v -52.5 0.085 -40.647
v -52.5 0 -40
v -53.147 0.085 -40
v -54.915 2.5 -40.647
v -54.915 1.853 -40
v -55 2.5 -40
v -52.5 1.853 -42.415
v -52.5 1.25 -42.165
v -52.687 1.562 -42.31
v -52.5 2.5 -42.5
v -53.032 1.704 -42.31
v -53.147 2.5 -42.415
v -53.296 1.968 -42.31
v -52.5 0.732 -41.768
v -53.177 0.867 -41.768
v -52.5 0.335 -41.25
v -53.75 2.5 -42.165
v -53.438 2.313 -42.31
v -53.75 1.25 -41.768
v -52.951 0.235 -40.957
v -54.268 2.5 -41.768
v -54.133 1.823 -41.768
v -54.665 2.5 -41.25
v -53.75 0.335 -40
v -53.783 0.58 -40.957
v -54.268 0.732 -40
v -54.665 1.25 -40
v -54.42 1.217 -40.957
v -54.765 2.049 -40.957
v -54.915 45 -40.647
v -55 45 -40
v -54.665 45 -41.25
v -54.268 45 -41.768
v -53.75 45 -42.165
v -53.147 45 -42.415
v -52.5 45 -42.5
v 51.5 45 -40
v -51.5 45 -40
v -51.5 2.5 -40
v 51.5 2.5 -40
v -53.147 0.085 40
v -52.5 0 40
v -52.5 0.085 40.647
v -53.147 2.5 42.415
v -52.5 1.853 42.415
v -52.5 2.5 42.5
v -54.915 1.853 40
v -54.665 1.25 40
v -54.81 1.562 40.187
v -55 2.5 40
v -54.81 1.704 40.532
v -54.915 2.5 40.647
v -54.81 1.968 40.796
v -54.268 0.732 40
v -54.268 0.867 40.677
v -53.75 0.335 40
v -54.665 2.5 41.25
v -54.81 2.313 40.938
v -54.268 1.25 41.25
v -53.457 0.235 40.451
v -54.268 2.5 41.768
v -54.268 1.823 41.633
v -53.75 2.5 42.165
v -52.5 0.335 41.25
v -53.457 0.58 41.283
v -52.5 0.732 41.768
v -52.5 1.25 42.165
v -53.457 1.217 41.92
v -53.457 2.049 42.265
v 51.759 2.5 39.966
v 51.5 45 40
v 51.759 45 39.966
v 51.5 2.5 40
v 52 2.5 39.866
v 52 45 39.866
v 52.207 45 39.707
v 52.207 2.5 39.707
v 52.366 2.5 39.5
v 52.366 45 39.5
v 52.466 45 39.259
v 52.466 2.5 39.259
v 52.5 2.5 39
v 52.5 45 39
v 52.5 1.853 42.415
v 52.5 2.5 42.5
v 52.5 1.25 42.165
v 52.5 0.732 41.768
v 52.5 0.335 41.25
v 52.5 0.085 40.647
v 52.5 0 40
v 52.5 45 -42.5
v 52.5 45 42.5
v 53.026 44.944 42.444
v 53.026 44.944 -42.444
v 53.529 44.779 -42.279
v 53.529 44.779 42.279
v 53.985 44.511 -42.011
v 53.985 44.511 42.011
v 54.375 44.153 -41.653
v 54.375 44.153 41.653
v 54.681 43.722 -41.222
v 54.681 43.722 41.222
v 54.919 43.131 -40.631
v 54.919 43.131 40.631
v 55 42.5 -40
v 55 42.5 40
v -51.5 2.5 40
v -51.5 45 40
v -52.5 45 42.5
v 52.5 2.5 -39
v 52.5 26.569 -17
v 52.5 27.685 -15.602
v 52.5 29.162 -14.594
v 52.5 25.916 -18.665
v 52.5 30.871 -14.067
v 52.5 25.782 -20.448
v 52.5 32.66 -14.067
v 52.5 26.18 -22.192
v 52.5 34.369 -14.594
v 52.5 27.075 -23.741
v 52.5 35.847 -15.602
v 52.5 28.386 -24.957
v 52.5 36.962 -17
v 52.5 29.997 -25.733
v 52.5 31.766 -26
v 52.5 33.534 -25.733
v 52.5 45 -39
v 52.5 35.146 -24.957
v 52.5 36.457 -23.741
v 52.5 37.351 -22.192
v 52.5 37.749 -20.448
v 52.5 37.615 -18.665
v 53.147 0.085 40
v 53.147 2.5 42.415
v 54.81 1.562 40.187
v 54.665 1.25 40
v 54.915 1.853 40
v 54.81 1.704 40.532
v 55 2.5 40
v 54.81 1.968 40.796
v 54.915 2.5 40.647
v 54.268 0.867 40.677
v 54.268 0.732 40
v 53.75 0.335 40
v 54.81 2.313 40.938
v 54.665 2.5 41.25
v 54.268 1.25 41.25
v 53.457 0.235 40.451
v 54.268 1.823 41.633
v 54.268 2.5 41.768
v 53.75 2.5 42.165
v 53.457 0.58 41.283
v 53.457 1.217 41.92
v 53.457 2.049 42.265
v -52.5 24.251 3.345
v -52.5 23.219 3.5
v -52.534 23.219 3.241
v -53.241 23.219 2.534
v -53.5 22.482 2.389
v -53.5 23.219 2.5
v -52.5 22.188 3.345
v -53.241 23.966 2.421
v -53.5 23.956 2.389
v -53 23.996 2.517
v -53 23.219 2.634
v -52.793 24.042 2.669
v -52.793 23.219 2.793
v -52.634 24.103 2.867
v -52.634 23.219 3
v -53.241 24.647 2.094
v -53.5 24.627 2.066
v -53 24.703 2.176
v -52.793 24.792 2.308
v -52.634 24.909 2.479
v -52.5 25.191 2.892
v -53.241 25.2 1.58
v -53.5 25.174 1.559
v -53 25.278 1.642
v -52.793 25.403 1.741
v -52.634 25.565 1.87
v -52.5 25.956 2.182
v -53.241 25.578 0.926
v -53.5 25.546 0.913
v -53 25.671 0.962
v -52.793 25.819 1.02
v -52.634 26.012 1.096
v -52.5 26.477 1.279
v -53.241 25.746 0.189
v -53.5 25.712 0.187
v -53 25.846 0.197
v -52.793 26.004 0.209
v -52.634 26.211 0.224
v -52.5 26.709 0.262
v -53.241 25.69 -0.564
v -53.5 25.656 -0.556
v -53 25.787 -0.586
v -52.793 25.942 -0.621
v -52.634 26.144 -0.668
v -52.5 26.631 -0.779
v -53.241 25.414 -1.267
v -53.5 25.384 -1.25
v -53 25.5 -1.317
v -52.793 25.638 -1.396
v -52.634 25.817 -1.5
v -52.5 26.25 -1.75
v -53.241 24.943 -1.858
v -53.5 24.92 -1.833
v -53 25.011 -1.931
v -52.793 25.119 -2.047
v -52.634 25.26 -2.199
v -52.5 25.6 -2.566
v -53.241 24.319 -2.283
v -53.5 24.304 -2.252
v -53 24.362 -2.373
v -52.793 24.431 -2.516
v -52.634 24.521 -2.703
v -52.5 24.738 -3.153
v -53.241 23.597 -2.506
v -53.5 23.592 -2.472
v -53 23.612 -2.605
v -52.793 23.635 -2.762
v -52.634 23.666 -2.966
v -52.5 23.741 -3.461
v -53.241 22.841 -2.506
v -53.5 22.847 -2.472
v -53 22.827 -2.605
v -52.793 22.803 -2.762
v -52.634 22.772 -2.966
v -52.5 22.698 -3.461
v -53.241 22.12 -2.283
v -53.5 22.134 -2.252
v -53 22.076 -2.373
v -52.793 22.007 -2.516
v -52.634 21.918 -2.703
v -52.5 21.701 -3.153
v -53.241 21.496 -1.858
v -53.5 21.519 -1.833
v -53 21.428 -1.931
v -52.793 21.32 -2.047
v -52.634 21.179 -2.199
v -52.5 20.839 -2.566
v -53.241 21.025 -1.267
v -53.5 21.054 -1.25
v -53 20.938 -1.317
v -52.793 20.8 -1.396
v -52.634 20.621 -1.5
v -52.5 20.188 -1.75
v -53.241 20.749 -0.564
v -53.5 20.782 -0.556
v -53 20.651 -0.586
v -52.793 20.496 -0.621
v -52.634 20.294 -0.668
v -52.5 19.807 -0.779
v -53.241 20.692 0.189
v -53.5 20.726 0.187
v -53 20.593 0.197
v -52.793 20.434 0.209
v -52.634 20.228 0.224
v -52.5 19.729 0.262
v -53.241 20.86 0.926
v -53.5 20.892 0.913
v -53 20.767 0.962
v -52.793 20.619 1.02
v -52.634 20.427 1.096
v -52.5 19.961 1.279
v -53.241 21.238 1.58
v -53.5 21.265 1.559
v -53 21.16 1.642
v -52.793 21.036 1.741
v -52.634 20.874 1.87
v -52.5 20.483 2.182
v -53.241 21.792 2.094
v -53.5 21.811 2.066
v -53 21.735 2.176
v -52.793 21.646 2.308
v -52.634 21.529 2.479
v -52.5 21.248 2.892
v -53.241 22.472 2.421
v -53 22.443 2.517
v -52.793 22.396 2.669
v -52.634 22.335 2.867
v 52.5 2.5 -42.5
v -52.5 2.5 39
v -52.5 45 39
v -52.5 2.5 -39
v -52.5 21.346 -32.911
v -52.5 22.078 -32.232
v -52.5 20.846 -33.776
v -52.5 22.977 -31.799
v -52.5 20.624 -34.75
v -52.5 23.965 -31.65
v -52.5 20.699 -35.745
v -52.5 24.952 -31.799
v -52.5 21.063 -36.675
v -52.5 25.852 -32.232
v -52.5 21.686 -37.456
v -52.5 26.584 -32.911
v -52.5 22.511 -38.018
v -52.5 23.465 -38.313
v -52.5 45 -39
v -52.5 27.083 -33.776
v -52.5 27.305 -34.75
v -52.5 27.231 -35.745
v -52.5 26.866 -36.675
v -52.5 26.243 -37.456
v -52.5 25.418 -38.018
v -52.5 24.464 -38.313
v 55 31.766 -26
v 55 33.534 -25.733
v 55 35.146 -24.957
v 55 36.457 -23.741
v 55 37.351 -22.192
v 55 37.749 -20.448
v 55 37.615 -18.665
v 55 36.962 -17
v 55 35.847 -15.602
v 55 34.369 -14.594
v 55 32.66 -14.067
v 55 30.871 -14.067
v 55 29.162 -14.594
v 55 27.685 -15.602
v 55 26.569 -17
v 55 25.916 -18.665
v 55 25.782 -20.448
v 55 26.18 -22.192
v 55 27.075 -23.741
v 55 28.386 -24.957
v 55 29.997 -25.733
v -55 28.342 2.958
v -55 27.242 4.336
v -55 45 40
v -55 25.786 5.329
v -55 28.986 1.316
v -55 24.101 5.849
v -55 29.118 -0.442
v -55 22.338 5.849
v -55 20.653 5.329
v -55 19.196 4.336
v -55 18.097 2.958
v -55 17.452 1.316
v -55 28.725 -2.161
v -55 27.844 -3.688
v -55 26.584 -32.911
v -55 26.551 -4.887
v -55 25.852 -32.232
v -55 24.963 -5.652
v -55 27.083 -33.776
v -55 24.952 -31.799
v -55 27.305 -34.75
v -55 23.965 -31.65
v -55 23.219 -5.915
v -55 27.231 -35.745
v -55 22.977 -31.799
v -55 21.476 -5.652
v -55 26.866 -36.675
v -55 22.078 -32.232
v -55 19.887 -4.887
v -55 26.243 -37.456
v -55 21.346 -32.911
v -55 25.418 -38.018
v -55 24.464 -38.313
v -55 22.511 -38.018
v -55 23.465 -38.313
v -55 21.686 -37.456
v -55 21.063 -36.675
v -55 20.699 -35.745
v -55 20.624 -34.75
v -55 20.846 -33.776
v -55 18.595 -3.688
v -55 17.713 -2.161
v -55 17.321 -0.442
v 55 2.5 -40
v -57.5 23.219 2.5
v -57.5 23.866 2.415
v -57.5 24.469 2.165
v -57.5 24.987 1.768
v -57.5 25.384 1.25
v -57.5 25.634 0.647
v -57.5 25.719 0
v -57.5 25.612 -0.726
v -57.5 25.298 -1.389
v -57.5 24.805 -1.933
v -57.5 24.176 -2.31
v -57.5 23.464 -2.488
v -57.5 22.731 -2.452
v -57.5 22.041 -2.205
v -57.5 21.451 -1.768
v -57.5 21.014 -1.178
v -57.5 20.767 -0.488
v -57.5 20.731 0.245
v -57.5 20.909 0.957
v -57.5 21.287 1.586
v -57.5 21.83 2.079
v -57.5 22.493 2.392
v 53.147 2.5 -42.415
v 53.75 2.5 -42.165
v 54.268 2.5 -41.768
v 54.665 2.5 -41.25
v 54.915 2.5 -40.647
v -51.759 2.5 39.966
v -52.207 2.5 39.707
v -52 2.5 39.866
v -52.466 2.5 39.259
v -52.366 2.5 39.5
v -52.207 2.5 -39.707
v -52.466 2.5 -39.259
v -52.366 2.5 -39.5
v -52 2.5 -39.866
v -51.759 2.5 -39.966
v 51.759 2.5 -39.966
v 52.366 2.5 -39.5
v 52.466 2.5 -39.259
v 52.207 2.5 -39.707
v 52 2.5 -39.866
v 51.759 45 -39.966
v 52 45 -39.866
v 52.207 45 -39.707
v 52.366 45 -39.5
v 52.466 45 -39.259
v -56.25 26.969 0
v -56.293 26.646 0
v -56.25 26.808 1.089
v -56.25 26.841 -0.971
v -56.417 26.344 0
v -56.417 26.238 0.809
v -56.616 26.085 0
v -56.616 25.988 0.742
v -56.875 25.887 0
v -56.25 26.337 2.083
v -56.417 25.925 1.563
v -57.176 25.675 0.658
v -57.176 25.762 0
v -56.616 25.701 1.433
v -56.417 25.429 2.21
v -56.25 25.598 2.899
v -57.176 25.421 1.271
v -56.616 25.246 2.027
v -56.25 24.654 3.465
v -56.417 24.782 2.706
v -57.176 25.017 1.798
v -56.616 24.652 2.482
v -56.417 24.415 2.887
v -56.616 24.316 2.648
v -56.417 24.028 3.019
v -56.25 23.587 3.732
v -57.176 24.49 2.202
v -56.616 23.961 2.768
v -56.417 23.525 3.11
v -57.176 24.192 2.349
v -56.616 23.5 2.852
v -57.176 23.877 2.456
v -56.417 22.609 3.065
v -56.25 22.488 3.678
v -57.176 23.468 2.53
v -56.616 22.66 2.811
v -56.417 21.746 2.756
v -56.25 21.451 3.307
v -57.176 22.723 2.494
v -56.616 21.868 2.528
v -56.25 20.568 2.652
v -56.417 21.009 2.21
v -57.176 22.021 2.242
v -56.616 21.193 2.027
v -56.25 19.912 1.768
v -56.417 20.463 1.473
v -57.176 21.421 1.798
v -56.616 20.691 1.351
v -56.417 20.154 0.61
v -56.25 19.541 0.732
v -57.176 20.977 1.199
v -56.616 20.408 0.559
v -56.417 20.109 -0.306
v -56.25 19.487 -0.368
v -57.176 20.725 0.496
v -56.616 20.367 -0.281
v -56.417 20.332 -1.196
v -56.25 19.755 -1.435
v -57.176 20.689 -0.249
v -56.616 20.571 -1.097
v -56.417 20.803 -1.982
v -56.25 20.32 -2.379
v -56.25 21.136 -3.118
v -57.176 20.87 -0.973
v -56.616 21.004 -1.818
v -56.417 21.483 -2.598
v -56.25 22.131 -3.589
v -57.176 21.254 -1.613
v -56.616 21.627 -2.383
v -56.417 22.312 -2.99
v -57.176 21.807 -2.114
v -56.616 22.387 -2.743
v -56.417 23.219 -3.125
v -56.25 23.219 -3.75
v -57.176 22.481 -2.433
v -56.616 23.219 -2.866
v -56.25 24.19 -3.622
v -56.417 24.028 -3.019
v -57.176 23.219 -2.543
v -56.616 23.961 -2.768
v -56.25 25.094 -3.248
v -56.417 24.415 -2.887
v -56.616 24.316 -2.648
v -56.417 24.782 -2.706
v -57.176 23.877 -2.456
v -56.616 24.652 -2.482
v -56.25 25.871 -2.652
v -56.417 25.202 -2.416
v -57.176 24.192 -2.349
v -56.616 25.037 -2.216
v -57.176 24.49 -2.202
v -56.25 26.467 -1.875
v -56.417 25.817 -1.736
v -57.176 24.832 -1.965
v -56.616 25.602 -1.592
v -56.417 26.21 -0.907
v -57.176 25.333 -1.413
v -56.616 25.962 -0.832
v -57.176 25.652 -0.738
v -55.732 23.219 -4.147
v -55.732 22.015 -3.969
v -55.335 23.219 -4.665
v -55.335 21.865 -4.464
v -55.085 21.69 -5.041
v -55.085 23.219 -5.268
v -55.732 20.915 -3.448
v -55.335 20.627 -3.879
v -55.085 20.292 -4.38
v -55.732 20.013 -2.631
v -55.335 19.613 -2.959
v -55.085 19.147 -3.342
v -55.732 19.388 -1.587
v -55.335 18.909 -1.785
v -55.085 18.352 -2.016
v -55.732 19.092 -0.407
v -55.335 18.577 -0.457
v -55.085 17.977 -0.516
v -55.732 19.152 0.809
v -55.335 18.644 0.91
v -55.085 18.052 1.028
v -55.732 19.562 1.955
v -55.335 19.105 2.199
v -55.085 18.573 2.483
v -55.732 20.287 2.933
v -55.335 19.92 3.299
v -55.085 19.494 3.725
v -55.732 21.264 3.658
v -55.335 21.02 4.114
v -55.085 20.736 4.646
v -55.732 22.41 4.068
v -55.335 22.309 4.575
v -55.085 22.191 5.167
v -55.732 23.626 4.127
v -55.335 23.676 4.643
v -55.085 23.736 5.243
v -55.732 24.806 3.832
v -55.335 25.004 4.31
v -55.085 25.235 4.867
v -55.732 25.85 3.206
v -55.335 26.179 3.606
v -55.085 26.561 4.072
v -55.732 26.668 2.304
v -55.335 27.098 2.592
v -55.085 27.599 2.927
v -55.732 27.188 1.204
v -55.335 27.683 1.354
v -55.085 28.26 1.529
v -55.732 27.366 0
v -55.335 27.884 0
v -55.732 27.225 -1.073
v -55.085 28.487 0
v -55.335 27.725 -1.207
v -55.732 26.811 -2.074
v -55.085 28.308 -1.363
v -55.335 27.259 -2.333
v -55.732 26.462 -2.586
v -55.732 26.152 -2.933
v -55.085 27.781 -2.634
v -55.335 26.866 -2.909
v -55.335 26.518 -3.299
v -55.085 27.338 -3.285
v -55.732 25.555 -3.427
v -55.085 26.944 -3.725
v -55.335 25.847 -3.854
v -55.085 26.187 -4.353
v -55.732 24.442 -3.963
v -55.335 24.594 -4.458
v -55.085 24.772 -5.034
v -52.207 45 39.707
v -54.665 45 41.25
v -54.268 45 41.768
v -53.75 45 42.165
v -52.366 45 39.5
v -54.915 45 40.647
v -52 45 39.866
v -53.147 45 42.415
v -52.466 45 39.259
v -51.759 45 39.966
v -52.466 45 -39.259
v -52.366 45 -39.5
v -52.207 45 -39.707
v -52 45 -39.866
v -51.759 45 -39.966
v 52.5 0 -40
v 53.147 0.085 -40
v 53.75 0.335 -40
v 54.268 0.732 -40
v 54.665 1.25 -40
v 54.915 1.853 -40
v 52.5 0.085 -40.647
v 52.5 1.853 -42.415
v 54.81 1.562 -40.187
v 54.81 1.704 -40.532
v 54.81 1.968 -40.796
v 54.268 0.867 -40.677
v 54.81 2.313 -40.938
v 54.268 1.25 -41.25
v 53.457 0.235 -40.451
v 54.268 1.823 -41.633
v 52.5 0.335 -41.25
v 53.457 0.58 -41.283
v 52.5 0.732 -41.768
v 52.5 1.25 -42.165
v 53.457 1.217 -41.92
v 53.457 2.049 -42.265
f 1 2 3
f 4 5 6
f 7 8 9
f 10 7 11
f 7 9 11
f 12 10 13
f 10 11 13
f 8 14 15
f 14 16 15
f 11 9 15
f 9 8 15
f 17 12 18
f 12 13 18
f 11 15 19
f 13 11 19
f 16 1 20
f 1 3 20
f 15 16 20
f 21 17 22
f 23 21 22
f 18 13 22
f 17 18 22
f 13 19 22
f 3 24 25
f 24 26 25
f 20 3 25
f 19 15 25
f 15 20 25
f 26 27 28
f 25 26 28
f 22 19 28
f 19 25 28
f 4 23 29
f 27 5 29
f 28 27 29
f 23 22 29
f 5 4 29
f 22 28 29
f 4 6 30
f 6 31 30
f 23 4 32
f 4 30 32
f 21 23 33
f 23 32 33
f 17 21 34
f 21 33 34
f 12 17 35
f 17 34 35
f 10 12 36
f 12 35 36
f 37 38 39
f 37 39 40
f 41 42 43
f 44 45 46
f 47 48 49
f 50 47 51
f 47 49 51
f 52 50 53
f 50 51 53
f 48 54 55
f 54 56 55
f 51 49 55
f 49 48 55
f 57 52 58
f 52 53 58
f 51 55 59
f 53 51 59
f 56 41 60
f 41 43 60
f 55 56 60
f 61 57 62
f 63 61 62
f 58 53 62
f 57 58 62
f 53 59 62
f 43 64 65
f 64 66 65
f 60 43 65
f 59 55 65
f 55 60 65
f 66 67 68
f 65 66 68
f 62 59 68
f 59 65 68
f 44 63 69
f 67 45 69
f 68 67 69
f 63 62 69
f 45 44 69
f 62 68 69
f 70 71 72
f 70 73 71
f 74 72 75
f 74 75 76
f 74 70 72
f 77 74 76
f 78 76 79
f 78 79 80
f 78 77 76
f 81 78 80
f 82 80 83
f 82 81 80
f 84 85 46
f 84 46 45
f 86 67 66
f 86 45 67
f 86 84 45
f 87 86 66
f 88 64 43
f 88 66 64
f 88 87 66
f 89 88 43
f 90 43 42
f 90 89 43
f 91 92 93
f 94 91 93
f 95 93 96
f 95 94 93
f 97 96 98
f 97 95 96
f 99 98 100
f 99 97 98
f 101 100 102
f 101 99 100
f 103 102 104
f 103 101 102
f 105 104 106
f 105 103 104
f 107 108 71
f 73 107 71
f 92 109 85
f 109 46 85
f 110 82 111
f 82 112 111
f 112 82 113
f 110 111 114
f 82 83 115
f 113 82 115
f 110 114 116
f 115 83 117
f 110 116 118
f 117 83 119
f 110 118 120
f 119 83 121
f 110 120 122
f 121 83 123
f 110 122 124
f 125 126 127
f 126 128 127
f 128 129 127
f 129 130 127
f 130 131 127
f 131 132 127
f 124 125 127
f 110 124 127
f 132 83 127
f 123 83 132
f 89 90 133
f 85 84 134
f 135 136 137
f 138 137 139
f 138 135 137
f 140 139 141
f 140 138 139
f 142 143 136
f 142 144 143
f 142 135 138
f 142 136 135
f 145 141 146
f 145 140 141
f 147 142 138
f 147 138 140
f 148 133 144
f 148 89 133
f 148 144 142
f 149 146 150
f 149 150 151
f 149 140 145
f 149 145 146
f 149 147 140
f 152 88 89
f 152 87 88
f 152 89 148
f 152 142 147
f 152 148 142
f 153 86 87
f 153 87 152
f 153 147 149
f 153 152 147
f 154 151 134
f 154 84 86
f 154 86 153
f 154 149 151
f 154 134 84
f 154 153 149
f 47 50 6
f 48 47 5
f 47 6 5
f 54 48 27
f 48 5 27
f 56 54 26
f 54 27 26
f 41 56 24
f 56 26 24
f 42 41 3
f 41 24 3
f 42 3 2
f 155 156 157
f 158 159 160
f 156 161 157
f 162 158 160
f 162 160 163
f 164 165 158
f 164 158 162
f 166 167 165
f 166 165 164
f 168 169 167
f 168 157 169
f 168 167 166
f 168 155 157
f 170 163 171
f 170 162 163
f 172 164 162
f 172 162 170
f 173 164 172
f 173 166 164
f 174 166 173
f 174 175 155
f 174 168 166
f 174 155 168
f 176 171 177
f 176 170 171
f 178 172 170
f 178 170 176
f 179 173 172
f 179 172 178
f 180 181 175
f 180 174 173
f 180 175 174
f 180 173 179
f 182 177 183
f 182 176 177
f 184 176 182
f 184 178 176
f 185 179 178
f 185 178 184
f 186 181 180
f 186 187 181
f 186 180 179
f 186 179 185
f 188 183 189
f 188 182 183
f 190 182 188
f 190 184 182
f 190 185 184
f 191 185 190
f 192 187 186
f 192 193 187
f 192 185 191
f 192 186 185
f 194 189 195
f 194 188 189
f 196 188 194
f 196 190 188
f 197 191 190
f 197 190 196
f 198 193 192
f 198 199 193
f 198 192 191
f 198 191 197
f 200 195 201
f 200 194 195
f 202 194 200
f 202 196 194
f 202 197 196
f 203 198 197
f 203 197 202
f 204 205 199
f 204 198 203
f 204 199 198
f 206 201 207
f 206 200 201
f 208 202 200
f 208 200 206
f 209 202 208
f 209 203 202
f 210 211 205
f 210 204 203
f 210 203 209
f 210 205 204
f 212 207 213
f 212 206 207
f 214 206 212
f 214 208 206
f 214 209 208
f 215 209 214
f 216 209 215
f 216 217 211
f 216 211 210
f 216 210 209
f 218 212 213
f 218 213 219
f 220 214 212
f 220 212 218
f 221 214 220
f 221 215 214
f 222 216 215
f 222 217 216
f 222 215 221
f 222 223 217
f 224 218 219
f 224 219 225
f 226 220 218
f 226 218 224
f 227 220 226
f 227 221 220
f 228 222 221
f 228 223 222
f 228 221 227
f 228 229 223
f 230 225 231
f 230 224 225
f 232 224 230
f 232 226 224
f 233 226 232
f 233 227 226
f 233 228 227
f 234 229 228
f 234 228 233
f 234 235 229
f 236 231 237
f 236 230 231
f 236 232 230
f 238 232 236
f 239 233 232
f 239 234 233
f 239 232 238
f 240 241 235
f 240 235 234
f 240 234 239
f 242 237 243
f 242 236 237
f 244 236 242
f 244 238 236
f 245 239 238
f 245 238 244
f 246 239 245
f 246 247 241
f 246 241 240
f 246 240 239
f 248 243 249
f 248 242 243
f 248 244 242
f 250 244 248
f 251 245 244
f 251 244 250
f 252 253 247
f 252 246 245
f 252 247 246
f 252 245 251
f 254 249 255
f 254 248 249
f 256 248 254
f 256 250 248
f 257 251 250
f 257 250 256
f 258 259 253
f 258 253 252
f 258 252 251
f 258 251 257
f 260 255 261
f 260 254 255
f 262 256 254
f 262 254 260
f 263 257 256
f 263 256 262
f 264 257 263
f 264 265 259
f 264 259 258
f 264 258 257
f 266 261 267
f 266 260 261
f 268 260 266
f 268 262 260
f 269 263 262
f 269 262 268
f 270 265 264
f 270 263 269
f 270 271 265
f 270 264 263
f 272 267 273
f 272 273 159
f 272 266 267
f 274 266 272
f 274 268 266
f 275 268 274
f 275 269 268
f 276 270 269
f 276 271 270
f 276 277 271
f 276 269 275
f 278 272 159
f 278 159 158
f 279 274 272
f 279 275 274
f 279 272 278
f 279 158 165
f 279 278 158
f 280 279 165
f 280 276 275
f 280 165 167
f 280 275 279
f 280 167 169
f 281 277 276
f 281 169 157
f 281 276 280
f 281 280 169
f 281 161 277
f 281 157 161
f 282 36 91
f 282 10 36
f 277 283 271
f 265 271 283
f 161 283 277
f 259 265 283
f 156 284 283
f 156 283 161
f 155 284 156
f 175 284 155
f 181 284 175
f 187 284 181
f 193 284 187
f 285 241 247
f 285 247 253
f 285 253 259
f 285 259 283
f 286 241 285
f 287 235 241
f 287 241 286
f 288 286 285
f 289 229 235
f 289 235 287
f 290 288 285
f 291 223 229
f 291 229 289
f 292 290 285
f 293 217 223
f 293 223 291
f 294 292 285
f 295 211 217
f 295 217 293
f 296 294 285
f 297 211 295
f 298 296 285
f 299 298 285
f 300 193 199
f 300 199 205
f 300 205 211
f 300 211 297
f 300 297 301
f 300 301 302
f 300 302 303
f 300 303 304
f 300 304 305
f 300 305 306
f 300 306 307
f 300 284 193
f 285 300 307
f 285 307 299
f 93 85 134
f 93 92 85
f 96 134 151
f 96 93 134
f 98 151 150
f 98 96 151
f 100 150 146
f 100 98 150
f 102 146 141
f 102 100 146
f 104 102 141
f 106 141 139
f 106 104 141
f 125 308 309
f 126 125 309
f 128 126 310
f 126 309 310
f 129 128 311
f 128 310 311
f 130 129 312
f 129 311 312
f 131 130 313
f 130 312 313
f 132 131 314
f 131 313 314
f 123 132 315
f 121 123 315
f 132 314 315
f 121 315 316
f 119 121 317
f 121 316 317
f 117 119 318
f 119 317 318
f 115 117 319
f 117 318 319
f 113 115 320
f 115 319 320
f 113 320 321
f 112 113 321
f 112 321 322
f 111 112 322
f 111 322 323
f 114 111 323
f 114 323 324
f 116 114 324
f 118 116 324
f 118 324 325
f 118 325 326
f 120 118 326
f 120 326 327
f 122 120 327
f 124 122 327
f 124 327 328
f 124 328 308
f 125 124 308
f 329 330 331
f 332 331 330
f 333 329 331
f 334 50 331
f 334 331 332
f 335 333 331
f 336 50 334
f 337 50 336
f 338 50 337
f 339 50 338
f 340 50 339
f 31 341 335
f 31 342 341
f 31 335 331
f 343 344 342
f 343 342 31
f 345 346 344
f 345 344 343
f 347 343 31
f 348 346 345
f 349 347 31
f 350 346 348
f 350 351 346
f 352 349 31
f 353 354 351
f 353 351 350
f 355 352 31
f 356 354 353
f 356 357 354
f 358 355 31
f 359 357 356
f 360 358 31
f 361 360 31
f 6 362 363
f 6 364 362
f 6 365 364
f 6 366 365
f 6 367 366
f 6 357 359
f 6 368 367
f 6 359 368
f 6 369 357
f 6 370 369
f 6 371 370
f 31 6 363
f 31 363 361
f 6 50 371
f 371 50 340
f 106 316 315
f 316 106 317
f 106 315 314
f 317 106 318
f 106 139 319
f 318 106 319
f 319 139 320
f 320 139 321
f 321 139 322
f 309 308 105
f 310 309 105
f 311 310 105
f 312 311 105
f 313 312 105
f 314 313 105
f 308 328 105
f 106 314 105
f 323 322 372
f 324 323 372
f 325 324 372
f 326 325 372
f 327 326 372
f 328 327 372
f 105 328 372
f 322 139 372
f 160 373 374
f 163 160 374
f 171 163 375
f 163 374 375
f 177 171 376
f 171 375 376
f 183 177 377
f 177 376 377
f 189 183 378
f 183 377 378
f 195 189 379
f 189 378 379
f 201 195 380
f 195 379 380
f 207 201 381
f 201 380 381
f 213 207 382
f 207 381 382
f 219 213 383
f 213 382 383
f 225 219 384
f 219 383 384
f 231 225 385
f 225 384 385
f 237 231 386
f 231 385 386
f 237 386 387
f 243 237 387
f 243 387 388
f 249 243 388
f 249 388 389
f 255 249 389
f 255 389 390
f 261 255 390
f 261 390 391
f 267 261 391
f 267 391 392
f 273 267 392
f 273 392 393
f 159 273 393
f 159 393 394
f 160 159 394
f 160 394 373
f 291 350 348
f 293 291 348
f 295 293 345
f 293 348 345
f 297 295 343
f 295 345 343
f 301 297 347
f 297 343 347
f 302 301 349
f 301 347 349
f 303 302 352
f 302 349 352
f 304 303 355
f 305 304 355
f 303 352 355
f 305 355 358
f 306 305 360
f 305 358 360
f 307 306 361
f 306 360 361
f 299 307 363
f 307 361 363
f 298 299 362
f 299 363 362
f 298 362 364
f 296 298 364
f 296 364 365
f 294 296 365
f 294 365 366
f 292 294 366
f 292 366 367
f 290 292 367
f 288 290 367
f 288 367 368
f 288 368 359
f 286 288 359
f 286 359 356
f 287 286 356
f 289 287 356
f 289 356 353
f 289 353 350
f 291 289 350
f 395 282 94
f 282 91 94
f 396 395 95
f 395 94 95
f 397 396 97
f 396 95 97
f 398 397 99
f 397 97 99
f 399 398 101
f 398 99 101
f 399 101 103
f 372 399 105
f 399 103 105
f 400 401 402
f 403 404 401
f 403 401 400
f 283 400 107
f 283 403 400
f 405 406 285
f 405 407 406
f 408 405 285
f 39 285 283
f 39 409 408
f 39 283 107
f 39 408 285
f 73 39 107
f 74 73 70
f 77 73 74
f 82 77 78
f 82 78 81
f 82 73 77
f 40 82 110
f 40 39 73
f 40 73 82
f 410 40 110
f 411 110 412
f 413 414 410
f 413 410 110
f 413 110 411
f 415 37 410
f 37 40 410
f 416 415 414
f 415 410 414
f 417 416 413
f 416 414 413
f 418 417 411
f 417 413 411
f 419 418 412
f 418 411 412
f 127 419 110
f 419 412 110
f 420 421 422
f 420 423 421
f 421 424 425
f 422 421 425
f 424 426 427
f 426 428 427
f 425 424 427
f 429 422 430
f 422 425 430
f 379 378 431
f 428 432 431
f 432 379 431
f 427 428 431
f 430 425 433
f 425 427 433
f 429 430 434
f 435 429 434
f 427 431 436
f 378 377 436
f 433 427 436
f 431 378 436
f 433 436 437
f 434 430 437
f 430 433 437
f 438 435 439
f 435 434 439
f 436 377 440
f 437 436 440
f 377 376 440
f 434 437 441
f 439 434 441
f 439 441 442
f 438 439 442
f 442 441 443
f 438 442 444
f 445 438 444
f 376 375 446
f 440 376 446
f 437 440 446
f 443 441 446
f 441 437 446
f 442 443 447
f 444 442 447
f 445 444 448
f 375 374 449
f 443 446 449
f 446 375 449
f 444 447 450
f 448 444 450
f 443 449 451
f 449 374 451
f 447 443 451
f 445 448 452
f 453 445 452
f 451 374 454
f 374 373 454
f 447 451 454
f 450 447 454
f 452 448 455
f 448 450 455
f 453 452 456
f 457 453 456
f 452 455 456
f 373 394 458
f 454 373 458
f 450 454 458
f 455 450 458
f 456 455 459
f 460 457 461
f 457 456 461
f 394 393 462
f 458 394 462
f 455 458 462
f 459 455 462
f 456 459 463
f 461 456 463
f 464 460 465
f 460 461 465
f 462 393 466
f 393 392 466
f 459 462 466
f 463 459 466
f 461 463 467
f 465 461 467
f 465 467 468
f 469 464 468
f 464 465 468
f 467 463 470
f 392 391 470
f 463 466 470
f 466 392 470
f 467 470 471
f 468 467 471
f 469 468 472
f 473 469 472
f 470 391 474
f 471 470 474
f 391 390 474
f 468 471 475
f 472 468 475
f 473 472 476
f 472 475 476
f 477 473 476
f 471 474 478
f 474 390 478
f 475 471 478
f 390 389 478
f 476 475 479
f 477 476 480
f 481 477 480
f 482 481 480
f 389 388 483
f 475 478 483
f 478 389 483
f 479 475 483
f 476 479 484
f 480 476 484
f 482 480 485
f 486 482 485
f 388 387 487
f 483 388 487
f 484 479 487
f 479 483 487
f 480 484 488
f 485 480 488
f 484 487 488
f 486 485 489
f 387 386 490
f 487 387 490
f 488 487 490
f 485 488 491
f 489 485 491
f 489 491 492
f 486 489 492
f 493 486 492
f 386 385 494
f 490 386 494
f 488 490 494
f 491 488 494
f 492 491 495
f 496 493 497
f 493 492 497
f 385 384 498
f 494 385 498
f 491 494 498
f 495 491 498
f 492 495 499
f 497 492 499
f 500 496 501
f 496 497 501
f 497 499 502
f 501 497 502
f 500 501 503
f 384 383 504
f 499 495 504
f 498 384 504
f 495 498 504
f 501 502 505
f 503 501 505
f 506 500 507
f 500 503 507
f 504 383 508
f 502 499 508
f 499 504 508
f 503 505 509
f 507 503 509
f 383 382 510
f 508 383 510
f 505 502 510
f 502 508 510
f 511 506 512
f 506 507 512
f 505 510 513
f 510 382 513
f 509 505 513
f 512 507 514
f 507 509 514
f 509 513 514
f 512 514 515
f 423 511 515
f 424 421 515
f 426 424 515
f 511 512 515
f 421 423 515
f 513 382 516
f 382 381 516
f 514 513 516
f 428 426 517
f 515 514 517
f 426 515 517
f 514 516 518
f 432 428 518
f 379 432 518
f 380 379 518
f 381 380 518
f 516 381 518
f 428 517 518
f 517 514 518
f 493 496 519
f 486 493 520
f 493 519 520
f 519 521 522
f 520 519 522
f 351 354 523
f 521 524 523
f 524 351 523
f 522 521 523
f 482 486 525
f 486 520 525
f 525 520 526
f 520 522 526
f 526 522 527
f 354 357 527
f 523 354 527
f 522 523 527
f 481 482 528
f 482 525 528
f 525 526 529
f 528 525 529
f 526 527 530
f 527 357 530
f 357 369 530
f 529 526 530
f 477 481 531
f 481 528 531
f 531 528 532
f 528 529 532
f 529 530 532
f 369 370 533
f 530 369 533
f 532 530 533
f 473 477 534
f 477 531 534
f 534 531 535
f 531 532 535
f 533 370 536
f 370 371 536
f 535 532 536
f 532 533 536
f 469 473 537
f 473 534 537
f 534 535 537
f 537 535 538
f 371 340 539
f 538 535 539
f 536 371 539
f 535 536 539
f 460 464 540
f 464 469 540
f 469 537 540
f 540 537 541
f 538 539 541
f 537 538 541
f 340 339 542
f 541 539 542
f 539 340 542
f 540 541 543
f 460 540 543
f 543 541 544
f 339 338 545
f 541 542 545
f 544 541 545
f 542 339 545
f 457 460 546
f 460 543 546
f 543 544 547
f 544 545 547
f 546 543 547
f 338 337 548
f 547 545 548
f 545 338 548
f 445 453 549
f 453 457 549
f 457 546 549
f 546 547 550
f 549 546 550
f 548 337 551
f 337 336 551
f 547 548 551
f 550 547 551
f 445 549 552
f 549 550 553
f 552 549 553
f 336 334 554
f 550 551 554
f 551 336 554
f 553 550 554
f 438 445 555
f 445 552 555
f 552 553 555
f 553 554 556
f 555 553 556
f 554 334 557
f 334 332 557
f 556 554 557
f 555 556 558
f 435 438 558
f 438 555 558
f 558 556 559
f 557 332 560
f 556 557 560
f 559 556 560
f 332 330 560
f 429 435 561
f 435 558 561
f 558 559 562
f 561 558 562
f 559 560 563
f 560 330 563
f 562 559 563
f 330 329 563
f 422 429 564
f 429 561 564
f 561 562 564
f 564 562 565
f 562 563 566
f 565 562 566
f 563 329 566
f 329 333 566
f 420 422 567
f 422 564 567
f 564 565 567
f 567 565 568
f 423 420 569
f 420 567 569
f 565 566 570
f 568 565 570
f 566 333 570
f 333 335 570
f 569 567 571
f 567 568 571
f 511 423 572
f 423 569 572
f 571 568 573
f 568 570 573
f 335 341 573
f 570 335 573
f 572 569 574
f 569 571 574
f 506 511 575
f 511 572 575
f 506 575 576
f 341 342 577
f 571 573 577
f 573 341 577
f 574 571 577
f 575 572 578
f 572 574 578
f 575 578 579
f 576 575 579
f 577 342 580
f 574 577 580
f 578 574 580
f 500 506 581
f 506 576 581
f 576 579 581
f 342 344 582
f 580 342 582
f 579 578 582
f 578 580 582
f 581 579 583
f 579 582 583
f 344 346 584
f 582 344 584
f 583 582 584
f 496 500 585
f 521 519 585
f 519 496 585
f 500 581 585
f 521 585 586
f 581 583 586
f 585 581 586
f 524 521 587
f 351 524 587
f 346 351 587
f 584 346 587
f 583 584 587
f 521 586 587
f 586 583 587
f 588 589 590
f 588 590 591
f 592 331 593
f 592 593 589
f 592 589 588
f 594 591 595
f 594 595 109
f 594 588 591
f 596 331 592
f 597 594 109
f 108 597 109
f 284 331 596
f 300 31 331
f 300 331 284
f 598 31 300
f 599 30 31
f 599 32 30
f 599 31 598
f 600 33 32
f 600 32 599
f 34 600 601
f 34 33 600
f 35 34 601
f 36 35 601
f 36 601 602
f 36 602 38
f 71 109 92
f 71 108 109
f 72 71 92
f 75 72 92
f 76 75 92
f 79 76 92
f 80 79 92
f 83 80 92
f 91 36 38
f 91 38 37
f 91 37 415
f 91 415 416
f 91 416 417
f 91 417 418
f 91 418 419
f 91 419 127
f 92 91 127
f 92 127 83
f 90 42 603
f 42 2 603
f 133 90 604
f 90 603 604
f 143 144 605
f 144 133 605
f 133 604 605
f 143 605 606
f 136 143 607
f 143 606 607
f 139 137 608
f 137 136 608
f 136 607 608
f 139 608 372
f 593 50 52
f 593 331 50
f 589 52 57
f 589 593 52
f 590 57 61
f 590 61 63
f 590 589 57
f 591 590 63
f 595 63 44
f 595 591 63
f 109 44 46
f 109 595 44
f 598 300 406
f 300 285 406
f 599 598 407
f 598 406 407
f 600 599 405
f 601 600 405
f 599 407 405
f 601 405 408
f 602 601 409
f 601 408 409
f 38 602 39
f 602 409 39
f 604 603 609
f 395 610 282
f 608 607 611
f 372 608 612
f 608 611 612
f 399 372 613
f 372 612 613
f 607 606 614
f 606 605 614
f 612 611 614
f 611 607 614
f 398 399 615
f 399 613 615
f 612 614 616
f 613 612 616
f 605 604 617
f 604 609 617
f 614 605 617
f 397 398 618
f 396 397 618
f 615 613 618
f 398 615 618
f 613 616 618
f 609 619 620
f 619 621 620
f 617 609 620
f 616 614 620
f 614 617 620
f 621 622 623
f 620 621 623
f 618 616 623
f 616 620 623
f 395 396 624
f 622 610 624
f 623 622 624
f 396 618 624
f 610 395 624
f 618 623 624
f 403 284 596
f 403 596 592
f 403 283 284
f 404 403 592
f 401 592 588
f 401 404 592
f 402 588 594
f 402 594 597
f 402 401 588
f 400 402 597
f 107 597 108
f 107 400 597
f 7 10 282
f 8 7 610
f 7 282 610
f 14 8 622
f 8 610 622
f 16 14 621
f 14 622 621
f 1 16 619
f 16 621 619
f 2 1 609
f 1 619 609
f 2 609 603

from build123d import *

# Parameters (mm, degrees)
SKETCH1_W           = 110
SKETCH1_H           = 85
BOSS_EXTRUDE1_DEPTH = 45
SKETCH2_W           = 105
SKETCH2_H           = 80
CUT_EXTRUDE1_DEPTH  = 42.5
FILLET1_R           = 2.5
SKETCH3_R           = 3.75
BOSS_EXTRUDE3_DEPTH = 2.5
SKETCH5_R           = 2.5
CUT_EXTRUDE2_DEPTH  = 30
FILLET2_R           = 2.5
FILLET3_R           = 1
FILLET4_R           = 1
SKETCH12_R          = 6
CUT_EXTRUDE3_DEPTH  = 30
SKETCH13_R          = 3.35
CUT_EXTRUDE4_DEPTH  = 30


# Read off the part's stored shape, not the designer's step: Cut-Sweep1
# Some blends are built 0.0001 mm under size
with BuildPart() as part:
    # Sketch1 → Boss-Extrude1 (new body)
    with BuildSketch(Plane(origin=(0, 0, 0), x_dir=(1, 0, 0), z_dir=(0, 1, 0))):
        Rectangle(SKETCH1_W, SKETCH1_H)
    extrude(amount=BOSS_EXTRUDE1_DEPTH)

    # Sketch2 → Cut-Extrude1 (cut)
    with BuildSketch(Plane(origin=(0, 45, 0), x_dir=(1, 0, 0), z_dir=(0, 1, 0))):
        Rectangle(SKETCH2_W, SKETCH2_H)
    extrude(amount=-CUT_EXTRUDE1_DEPTH, mode=Mode.SUBTRACT)

    # Fillet1
    fillet1_edges = [part.edges().sort_by_distance(p)[0] for p in [
        (55, 45, 0),
        (0, 0, 42.5),
        (-55, 0, 0),
        (0, 0, -42.5),
        (55, 0, 0),
        (55, 22.5, 42.5),
        (-55, 22.5, 42.5),
        (-55, 22.5, -42.5),
        (55, 22.5, -42.5),
    ]]
    fillet(fillet1_edges, radius=FILLET1_R - 0.0001)  # a hair under: the kernel refuses the full size

    # Sketch3 → Boss-Extrude3 (add)
    with BuildSketch(Plane.ZY.offset(55)):
        with Locations(Location((0, 23.219153855, 0), (0, 0, 180))):
            Circle(SKETCH3_R)
    extrude(amount=BOSS_EXTRUDE3_DEPTH)

    # Sketch5 → Cut-Extrude2 (cut)
    with BuildSketch(Plane.ZY.offset(57.5)):
        with Locations((0, 23.219153855)):
            Circle(SKETCH5_R)
    extrude(amount=-CUT_EXTRUDE2_DEPTH, mode=Mode.SUBTRACT)

    # Cut-Sweep1 outline → Cut-Sweep1 (revolve, cut)
    with BuildSketch(Plane(origin=(0, 23.219153855, 0), x_dir=(0, 1, 0), z_dir=(0, 0, -1))):
        with BuildLine():
            ThreePointArc((3.75, -56.25), (2.866116524, -56.616116524), (2.5, -57.5))
            Line((2.5, -57.5), (3.75, -57.5))
            Line((3.75, -57.5), (3.75, -56.25))
        make_face()
    revolve(axis=Axis((0, 23.219153855, 0), (1, 0, 0)), mode=Mode.SUBTRACT)

    # Fillet2
    # the kernel refuses this fillet: 2.5 mm, written as the material it adds along each edge
    with BuildSketch(Plane(origin=(-55, 23.219153855, 0), x_dir=(0, 0, -1), z_dir=(0, 1, 0))) as fillet2_piece_1:
        with BuildLine():
            CenterArc((5.915063509, 2.5), FILLET2_R, 210, 60)
            Line((3.75, 1.25), (3.70669873, 1.225))
            ThreePointArc((3.70669873, 1.225), (3.7, 0.625), (3.7, 0))
            Line((3.7, 0), (3.75, -0.05))
            Line((3.75, -0.05), (5.915063509, -0.05))
            Line((5.915063509, -0.05), (5.915063509, 0))
        make_face()
    revolve(axis=Axis((-55, 23.219153855, 0), (-1, 0, 0)))

    # Fillet3
    fillet3_edges = [part.edges().sort_by_distance(p)[0] for p in [
        (-52.5, 23.219153855, -2.5),
    ]]
    fillet(fillet3_edges, radius=FILLET3_R)

    # Fillet4
    fillet4_edges = [part.edges().sort_by_distance(p)[0] for p in [
        (52.5, 23.75, -40),
        (52.5, 23.75, 40),
        (-52.5, 23.75, 40),
        (-52.5, 23.75, -40),
    ]]
    fillet(fillet4_edges, radius=FILLET4_R)

    # Sketch12 → Cut-Extrude3 (cut)
    with BuildSketch(Plane(origin=(55, 0, 0), x_dir=(0, 0, -1), z_dir=(1, 0, 0))):
        with Locations((20, 31.765581052)):
            Circle(SKETCH12_R)
    extrude(amount=-CUT_EXTRUDE3_DEPTH, mode=Mode.SUBTRACT)

    # Sketch13 → Cut-Extrude4 (cut)
    with BuildSketch(Plane.ZY.offset(55)):
        with Locations((-35, 23.964639065)):
            Circle(SKETCH13_R)
    extrude(amount=-CUT_EXTRUDE4_DEPTH, mode=Mode.SUBTRACT)


solid = part.part
